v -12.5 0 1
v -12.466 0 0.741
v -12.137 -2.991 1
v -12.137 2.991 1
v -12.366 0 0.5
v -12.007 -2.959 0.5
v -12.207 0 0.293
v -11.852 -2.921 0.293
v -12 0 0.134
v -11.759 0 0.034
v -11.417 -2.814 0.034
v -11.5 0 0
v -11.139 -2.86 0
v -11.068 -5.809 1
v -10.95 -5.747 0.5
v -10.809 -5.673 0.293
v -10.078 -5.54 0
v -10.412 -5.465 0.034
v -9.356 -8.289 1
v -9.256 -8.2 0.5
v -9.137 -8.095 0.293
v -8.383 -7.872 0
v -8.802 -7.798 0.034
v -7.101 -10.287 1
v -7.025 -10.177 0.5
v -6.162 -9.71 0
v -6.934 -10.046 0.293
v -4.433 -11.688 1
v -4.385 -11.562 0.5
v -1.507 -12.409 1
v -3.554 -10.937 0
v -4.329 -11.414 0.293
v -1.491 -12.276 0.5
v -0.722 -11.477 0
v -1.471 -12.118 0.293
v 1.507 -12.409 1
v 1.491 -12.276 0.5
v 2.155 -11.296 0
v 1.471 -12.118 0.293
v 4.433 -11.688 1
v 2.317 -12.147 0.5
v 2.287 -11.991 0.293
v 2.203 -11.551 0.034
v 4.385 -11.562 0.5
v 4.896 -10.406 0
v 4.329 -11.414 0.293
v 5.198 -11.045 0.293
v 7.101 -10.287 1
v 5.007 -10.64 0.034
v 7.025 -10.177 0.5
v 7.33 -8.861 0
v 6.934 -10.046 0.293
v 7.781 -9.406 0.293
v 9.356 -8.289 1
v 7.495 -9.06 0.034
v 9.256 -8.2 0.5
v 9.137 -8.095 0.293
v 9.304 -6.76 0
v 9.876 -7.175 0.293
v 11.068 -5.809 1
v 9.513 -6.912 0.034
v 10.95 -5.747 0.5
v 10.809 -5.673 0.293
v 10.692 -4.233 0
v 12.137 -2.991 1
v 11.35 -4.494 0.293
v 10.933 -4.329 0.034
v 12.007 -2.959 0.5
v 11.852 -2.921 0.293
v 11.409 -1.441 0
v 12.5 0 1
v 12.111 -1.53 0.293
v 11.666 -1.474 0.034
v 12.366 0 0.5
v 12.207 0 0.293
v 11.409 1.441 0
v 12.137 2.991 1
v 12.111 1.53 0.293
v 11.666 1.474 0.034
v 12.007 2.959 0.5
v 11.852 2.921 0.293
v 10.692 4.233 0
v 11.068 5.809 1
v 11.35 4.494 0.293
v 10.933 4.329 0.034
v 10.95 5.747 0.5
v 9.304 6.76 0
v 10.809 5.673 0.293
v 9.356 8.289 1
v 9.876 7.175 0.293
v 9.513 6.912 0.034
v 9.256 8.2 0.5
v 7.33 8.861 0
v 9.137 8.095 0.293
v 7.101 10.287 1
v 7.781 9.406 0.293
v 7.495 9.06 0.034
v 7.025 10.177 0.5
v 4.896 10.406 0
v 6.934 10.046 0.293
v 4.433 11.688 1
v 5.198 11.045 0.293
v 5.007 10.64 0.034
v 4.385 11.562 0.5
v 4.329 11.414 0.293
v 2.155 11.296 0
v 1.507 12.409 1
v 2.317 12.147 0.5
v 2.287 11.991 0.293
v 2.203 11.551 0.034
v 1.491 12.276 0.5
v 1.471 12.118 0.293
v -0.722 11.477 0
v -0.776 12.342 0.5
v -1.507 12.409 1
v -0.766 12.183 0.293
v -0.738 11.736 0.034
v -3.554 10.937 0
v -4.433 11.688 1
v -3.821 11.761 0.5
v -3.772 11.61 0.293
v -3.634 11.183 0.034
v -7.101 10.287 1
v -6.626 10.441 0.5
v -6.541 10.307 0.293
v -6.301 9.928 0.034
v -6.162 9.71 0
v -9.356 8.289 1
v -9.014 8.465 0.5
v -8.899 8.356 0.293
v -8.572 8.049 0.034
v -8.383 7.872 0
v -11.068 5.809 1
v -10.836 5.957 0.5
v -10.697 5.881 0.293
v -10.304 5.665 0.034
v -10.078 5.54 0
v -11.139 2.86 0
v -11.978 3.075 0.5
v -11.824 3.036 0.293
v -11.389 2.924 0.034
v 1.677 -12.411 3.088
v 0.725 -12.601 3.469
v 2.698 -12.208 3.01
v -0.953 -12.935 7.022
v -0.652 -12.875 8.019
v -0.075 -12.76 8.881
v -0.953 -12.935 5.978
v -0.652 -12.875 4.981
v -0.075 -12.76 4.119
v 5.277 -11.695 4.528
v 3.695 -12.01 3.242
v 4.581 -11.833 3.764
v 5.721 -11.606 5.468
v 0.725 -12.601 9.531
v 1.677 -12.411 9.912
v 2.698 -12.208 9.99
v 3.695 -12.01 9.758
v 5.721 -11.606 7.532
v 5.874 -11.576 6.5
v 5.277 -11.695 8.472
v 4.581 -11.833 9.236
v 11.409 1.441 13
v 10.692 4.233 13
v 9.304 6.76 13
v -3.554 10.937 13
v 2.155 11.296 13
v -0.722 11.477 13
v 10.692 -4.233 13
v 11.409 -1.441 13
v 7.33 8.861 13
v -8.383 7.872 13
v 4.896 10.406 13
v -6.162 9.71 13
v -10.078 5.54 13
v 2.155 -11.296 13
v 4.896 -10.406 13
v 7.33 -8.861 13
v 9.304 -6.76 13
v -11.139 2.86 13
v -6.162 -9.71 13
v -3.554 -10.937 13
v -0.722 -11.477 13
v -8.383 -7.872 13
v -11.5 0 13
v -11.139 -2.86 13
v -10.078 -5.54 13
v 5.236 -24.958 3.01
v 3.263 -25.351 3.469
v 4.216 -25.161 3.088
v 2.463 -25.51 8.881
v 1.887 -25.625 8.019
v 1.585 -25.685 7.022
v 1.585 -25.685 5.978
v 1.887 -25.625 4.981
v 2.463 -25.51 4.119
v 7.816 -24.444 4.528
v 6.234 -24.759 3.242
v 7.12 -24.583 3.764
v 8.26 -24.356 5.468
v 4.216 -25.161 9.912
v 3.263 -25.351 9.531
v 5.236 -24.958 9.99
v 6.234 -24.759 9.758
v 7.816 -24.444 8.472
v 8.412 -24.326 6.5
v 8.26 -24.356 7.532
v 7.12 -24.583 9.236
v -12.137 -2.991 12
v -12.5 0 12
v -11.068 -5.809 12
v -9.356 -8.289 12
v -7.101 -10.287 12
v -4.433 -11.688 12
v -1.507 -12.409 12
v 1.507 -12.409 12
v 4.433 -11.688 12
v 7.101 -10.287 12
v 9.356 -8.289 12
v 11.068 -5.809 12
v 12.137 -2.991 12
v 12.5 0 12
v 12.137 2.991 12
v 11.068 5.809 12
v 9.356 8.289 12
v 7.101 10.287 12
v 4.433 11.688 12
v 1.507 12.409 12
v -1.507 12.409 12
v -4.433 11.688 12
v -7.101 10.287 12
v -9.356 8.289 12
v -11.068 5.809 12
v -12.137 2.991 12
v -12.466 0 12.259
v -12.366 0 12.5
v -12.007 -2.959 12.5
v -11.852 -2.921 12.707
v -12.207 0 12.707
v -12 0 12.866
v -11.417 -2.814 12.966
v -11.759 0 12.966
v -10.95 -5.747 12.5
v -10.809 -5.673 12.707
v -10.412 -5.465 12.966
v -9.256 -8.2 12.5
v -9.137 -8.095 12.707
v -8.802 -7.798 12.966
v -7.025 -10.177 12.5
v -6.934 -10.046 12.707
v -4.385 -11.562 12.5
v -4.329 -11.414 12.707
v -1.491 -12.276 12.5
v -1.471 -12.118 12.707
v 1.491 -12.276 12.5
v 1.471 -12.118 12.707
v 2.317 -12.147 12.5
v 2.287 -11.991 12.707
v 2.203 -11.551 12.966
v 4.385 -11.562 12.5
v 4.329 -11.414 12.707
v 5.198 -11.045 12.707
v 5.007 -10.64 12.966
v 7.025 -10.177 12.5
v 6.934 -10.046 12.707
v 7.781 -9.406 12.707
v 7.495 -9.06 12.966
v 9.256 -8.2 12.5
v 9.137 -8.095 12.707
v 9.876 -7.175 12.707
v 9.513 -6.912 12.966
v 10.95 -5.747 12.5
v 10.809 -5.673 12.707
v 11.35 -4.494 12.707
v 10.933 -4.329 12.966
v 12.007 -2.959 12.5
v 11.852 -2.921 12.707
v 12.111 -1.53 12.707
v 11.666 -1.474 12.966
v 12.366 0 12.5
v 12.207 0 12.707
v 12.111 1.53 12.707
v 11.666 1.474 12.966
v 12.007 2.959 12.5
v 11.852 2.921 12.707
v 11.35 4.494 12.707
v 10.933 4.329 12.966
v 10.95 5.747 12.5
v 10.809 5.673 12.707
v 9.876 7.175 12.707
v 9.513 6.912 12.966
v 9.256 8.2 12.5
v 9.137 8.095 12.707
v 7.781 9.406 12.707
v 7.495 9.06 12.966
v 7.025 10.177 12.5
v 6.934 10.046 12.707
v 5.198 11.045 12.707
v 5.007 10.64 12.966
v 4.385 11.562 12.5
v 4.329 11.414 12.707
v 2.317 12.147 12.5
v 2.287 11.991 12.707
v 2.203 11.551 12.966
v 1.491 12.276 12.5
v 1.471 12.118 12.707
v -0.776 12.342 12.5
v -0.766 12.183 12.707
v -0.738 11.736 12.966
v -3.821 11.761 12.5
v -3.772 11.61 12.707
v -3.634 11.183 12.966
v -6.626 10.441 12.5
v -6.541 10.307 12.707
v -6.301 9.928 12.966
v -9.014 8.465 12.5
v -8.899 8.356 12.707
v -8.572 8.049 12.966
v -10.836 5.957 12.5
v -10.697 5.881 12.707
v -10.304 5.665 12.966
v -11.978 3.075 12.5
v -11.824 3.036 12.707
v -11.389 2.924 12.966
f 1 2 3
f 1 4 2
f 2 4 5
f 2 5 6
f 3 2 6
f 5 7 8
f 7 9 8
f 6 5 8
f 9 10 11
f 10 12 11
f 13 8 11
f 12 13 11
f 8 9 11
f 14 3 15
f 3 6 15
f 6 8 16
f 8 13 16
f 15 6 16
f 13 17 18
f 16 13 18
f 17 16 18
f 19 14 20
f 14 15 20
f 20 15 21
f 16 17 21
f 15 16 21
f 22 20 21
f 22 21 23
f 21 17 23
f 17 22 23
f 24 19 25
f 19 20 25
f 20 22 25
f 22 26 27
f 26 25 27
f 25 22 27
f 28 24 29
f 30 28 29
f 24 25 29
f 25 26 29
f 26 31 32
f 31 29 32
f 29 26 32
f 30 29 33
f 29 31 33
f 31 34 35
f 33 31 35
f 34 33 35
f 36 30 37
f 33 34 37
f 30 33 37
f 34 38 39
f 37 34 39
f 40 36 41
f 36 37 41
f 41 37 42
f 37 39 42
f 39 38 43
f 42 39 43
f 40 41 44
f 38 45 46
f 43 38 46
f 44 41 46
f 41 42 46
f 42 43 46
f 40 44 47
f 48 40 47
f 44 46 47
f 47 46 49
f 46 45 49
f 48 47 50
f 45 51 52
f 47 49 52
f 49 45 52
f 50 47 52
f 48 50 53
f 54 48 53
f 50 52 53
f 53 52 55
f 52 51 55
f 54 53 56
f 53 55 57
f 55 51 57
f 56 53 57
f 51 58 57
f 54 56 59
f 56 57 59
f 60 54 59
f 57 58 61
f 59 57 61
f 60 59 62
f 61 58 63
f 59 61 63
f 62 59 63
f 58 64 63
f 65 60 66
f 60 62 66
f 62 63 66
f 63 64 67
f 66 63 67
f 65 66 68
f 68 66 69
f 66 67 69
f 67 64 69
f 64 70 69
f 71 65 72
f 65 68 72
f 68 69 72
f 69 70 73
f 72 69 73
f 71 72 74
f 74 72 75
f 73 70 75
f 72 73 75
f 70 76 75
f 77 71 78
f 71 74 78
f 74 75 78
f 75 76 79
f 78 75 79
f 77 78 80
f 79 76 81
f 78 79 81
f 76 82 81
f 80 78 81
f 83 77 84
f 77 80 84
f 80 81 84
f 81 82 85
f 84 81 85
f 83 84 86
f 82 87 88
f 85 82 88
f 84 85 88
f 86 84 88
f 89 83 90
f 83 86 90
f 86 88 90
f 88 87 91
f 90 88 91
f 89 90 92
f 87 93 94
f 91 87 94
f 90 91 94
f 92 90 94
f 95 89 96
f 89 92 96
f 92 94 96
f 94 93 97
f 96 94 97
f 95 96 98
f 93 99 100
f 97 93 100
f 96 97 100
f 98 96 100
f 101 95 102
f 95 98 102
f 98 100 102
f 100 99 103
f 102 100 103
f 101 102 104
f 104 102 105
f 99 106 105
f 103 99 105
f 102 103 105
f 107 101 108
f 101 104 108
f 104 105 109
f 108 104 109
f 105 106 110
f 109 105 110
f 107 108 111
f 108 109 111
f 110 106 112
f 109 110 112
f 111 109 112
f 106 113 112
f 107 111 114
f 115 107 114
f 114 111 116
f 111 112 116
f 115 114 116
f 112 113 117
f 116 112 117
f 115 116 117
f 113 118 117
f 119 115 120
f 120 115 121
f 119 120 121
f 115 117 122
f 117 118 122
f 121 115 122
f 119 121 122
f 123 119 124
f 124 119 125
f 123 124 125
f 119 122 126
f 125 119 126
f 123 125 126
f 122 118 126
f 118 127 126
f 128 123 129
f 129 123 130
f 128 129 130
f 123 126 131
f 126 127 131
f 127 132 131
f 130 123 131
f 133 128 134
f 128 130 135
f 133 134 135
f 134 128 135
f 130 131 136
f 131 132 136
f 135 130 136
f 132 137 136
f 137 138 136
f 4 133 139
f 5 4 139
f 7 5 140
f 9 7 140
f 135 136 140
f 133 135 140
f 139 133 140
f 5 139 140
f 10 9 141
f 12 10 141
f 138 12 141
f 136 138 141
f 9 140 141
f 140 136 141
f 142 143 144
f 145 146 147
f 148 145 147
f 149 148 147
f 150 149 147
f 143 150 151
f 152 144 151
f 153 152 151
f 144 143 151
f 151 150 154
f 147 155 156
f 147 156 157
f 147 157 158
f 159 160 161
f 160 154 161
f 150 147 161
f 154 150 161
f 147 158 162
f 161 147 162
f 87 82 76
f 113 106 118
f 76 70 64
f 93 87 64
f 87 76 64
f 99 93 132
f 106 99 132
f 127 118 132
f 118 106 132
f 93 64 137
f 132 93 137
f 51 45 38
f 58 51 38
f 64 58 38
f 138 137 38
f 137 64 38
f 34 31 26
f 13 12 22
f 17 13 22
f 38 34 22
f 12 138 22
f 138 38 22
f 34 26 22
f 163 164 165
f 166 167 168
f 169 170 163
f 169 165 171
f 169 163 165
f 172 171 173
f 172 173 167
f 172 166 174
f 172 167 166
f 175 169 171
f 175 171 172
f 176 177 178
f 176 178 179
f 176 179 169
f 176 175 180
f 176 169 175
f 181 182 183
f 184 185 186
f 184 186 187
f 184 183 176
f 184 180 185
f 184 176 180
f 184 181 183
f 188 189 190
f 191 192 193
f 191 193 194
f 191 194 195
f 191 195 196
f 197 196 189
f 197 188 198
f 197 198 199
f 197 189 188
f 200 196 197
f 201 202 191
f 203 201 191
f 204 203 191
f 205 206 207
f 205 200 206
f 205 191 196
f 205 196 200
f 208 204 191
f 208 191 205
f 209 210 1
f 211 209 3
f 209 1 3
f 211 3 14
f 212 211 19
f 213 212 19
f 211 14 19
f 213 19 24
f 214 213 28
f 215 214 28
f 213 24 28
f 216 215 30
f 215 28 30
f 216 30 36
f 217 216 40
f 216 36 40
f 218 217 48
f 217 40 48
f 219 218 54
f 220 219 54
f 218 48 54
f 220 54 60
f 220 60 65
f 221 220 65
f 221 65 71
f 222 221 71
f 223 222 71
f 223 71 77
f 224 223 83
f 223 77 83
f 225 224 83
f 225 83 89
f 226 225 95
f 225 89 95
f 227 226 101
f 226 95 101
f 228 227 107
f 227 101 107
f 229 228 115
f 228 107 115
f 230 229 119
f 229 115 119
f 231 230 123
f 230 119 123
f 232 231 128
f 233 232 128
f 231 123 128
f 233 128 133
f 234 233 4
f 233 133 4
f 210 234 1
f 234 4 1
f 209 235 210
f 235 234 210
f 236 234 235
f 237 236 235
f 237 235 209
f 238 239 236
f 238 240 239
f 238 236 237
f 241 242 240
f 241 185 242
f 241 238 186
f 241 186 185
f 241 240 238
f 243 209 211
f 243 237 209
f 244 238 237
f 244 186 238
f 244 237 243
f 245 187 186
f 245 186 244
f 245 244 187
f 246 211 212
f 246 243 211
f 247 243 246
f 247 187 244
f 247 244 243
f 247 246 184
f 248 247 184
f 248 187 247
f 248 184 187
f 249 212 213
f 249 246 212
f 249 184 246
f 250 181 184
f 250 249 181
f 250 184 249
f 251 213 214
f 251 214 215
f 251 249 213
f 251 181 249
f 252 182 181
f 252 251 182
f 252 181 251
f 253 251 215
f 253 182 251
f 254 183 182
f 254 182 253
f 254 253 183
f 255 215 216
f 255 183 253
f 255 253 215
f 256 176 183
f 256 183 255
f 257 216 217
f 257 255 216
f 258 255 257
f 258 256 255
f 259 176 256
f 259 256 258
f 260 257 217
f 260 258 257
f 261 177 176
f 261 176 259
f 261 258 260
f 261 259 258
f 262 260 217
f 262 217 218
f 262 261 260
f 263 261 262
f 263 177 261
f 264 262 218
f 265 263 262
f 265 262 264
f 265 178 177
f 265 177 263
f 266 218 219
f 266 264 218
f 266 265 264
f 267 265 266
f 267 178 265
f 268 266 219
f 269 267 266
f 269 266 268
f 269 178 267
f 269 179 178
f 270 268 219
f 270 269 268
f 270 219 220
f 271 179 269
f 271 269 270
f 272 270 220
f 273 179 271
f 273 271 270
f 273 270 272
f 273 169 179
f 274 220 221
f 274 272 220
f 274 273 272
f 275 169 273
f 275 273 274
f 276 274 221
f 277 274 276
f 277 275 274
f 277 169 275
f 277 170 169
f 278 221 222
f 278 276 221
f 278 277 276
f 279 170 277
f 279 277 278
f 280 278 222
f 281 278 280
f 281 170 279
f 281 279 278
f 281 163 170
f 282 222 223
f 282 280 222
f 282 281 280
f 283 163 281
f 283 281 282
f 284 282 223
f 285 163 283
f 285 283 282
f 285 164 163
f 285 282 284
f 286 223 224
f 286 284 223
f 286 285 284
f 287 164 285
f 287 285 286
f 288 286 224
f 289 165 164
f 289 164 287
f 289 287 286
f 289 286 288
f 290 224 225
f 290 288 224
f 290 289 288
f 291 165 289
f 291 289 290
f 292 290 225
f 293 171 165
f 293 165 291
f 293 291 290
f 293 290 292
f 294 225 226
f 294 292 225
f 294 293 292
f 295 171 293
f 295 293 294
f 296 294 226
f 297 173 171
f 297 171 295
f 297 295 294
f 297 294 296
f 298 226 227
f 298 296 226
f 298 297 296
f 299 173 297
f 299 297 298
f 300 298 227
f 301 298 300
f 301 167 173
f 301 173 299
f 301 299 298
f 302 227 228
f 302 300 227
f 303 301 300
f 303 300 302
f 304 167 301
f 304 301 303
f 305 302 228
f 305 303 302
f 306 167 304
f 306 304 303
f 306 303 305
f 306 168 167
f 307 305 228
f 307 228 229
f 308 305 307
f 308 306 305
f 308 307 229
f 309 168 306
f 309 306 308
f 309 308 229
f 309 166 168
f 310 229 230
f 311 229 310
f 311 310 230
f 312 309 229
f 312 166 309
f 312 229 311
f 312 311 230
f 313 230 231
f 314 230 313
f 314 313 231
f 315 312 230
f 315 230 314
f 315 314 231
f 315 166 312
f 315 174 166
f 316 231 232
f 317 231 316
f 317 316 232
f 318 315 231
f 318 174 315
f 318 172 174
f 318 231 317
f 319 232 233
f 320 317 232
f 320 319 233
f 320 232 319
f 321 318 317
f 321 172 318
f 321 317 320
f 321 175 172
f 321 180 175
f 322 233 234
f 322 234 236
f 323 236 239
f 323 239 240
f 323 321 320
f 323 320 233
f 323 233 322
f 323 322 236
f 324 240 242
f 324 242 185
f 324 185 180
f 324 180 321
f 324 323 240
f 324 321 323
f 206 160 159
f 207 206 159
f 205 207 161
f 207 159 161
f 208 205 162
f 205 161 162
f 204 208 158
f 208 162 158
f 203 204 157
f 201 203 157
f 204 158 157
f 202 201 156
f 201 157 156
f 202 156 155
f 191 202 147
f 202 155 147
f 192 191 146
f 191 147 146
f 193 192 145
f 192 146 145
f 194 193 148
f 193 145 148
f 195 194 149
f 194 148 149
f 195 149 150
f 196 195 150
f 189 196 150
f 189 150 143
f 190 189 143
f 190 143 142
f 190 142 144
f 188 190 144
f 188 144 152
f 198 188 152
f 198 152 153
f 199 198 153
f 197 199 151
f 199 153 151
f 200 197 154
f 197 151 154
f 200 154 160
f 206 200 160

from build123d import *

# Parameters (mm, degrees)
ESQUISSE1_R            = 12.5
BOSS_EXTRU_1_DEPTH     = 13
BOSS_EXTRU_2_START     = 12.5
BOSS_EXTRU_2_OUTLINE_R = 3.5
BOSS_EXTRU_2_DEPTH     = 13
CONG_1_R               = 1


# Read off the part's stored shape, not the designer's step: Boss.-Extru.2
with BuildPart() as part:
    # Esquisse1 → Boss.-Extru.1 (new body)
    with BuildSketch(Plane.XY):
        with Locations(Location((0, 0, 0), (0, 0, 180))):
            Circle(ESQUISSE1_R)
    extrude(amount=BOSS_EXTRU_1_DEPTH)

    # Congé1
    cong_1_edges = [part.edges().sort_by_distance(p)[0] for p in [
        (12.5, 0, 0),
        (12.5, 0, 13),
    ]]
    fillet(cong_1_edges, radius=CONG_1_R)


with BuildPart() as body_2:
    # Boss.-Extru.2 outline → Boss.-Extru.2 (new body)
    with BuildSketch(Plane(origin=(0, 0, 0), x_dir=(0.9807466597819918, 0.19528438065156695, 0), z_dir=(0.19528438065156695, -0.9807466597819918, 0)).offset(BOSS_EXTRU_2_START)):
        with Locations((0, 6.5)):
            Circle(BOSS_EXTRU_2_OUTLINE_R)
    extrude(amount=BOSS_EXTRU_2_DEPTH)


solid = Compound([part.part, body_2.part])
